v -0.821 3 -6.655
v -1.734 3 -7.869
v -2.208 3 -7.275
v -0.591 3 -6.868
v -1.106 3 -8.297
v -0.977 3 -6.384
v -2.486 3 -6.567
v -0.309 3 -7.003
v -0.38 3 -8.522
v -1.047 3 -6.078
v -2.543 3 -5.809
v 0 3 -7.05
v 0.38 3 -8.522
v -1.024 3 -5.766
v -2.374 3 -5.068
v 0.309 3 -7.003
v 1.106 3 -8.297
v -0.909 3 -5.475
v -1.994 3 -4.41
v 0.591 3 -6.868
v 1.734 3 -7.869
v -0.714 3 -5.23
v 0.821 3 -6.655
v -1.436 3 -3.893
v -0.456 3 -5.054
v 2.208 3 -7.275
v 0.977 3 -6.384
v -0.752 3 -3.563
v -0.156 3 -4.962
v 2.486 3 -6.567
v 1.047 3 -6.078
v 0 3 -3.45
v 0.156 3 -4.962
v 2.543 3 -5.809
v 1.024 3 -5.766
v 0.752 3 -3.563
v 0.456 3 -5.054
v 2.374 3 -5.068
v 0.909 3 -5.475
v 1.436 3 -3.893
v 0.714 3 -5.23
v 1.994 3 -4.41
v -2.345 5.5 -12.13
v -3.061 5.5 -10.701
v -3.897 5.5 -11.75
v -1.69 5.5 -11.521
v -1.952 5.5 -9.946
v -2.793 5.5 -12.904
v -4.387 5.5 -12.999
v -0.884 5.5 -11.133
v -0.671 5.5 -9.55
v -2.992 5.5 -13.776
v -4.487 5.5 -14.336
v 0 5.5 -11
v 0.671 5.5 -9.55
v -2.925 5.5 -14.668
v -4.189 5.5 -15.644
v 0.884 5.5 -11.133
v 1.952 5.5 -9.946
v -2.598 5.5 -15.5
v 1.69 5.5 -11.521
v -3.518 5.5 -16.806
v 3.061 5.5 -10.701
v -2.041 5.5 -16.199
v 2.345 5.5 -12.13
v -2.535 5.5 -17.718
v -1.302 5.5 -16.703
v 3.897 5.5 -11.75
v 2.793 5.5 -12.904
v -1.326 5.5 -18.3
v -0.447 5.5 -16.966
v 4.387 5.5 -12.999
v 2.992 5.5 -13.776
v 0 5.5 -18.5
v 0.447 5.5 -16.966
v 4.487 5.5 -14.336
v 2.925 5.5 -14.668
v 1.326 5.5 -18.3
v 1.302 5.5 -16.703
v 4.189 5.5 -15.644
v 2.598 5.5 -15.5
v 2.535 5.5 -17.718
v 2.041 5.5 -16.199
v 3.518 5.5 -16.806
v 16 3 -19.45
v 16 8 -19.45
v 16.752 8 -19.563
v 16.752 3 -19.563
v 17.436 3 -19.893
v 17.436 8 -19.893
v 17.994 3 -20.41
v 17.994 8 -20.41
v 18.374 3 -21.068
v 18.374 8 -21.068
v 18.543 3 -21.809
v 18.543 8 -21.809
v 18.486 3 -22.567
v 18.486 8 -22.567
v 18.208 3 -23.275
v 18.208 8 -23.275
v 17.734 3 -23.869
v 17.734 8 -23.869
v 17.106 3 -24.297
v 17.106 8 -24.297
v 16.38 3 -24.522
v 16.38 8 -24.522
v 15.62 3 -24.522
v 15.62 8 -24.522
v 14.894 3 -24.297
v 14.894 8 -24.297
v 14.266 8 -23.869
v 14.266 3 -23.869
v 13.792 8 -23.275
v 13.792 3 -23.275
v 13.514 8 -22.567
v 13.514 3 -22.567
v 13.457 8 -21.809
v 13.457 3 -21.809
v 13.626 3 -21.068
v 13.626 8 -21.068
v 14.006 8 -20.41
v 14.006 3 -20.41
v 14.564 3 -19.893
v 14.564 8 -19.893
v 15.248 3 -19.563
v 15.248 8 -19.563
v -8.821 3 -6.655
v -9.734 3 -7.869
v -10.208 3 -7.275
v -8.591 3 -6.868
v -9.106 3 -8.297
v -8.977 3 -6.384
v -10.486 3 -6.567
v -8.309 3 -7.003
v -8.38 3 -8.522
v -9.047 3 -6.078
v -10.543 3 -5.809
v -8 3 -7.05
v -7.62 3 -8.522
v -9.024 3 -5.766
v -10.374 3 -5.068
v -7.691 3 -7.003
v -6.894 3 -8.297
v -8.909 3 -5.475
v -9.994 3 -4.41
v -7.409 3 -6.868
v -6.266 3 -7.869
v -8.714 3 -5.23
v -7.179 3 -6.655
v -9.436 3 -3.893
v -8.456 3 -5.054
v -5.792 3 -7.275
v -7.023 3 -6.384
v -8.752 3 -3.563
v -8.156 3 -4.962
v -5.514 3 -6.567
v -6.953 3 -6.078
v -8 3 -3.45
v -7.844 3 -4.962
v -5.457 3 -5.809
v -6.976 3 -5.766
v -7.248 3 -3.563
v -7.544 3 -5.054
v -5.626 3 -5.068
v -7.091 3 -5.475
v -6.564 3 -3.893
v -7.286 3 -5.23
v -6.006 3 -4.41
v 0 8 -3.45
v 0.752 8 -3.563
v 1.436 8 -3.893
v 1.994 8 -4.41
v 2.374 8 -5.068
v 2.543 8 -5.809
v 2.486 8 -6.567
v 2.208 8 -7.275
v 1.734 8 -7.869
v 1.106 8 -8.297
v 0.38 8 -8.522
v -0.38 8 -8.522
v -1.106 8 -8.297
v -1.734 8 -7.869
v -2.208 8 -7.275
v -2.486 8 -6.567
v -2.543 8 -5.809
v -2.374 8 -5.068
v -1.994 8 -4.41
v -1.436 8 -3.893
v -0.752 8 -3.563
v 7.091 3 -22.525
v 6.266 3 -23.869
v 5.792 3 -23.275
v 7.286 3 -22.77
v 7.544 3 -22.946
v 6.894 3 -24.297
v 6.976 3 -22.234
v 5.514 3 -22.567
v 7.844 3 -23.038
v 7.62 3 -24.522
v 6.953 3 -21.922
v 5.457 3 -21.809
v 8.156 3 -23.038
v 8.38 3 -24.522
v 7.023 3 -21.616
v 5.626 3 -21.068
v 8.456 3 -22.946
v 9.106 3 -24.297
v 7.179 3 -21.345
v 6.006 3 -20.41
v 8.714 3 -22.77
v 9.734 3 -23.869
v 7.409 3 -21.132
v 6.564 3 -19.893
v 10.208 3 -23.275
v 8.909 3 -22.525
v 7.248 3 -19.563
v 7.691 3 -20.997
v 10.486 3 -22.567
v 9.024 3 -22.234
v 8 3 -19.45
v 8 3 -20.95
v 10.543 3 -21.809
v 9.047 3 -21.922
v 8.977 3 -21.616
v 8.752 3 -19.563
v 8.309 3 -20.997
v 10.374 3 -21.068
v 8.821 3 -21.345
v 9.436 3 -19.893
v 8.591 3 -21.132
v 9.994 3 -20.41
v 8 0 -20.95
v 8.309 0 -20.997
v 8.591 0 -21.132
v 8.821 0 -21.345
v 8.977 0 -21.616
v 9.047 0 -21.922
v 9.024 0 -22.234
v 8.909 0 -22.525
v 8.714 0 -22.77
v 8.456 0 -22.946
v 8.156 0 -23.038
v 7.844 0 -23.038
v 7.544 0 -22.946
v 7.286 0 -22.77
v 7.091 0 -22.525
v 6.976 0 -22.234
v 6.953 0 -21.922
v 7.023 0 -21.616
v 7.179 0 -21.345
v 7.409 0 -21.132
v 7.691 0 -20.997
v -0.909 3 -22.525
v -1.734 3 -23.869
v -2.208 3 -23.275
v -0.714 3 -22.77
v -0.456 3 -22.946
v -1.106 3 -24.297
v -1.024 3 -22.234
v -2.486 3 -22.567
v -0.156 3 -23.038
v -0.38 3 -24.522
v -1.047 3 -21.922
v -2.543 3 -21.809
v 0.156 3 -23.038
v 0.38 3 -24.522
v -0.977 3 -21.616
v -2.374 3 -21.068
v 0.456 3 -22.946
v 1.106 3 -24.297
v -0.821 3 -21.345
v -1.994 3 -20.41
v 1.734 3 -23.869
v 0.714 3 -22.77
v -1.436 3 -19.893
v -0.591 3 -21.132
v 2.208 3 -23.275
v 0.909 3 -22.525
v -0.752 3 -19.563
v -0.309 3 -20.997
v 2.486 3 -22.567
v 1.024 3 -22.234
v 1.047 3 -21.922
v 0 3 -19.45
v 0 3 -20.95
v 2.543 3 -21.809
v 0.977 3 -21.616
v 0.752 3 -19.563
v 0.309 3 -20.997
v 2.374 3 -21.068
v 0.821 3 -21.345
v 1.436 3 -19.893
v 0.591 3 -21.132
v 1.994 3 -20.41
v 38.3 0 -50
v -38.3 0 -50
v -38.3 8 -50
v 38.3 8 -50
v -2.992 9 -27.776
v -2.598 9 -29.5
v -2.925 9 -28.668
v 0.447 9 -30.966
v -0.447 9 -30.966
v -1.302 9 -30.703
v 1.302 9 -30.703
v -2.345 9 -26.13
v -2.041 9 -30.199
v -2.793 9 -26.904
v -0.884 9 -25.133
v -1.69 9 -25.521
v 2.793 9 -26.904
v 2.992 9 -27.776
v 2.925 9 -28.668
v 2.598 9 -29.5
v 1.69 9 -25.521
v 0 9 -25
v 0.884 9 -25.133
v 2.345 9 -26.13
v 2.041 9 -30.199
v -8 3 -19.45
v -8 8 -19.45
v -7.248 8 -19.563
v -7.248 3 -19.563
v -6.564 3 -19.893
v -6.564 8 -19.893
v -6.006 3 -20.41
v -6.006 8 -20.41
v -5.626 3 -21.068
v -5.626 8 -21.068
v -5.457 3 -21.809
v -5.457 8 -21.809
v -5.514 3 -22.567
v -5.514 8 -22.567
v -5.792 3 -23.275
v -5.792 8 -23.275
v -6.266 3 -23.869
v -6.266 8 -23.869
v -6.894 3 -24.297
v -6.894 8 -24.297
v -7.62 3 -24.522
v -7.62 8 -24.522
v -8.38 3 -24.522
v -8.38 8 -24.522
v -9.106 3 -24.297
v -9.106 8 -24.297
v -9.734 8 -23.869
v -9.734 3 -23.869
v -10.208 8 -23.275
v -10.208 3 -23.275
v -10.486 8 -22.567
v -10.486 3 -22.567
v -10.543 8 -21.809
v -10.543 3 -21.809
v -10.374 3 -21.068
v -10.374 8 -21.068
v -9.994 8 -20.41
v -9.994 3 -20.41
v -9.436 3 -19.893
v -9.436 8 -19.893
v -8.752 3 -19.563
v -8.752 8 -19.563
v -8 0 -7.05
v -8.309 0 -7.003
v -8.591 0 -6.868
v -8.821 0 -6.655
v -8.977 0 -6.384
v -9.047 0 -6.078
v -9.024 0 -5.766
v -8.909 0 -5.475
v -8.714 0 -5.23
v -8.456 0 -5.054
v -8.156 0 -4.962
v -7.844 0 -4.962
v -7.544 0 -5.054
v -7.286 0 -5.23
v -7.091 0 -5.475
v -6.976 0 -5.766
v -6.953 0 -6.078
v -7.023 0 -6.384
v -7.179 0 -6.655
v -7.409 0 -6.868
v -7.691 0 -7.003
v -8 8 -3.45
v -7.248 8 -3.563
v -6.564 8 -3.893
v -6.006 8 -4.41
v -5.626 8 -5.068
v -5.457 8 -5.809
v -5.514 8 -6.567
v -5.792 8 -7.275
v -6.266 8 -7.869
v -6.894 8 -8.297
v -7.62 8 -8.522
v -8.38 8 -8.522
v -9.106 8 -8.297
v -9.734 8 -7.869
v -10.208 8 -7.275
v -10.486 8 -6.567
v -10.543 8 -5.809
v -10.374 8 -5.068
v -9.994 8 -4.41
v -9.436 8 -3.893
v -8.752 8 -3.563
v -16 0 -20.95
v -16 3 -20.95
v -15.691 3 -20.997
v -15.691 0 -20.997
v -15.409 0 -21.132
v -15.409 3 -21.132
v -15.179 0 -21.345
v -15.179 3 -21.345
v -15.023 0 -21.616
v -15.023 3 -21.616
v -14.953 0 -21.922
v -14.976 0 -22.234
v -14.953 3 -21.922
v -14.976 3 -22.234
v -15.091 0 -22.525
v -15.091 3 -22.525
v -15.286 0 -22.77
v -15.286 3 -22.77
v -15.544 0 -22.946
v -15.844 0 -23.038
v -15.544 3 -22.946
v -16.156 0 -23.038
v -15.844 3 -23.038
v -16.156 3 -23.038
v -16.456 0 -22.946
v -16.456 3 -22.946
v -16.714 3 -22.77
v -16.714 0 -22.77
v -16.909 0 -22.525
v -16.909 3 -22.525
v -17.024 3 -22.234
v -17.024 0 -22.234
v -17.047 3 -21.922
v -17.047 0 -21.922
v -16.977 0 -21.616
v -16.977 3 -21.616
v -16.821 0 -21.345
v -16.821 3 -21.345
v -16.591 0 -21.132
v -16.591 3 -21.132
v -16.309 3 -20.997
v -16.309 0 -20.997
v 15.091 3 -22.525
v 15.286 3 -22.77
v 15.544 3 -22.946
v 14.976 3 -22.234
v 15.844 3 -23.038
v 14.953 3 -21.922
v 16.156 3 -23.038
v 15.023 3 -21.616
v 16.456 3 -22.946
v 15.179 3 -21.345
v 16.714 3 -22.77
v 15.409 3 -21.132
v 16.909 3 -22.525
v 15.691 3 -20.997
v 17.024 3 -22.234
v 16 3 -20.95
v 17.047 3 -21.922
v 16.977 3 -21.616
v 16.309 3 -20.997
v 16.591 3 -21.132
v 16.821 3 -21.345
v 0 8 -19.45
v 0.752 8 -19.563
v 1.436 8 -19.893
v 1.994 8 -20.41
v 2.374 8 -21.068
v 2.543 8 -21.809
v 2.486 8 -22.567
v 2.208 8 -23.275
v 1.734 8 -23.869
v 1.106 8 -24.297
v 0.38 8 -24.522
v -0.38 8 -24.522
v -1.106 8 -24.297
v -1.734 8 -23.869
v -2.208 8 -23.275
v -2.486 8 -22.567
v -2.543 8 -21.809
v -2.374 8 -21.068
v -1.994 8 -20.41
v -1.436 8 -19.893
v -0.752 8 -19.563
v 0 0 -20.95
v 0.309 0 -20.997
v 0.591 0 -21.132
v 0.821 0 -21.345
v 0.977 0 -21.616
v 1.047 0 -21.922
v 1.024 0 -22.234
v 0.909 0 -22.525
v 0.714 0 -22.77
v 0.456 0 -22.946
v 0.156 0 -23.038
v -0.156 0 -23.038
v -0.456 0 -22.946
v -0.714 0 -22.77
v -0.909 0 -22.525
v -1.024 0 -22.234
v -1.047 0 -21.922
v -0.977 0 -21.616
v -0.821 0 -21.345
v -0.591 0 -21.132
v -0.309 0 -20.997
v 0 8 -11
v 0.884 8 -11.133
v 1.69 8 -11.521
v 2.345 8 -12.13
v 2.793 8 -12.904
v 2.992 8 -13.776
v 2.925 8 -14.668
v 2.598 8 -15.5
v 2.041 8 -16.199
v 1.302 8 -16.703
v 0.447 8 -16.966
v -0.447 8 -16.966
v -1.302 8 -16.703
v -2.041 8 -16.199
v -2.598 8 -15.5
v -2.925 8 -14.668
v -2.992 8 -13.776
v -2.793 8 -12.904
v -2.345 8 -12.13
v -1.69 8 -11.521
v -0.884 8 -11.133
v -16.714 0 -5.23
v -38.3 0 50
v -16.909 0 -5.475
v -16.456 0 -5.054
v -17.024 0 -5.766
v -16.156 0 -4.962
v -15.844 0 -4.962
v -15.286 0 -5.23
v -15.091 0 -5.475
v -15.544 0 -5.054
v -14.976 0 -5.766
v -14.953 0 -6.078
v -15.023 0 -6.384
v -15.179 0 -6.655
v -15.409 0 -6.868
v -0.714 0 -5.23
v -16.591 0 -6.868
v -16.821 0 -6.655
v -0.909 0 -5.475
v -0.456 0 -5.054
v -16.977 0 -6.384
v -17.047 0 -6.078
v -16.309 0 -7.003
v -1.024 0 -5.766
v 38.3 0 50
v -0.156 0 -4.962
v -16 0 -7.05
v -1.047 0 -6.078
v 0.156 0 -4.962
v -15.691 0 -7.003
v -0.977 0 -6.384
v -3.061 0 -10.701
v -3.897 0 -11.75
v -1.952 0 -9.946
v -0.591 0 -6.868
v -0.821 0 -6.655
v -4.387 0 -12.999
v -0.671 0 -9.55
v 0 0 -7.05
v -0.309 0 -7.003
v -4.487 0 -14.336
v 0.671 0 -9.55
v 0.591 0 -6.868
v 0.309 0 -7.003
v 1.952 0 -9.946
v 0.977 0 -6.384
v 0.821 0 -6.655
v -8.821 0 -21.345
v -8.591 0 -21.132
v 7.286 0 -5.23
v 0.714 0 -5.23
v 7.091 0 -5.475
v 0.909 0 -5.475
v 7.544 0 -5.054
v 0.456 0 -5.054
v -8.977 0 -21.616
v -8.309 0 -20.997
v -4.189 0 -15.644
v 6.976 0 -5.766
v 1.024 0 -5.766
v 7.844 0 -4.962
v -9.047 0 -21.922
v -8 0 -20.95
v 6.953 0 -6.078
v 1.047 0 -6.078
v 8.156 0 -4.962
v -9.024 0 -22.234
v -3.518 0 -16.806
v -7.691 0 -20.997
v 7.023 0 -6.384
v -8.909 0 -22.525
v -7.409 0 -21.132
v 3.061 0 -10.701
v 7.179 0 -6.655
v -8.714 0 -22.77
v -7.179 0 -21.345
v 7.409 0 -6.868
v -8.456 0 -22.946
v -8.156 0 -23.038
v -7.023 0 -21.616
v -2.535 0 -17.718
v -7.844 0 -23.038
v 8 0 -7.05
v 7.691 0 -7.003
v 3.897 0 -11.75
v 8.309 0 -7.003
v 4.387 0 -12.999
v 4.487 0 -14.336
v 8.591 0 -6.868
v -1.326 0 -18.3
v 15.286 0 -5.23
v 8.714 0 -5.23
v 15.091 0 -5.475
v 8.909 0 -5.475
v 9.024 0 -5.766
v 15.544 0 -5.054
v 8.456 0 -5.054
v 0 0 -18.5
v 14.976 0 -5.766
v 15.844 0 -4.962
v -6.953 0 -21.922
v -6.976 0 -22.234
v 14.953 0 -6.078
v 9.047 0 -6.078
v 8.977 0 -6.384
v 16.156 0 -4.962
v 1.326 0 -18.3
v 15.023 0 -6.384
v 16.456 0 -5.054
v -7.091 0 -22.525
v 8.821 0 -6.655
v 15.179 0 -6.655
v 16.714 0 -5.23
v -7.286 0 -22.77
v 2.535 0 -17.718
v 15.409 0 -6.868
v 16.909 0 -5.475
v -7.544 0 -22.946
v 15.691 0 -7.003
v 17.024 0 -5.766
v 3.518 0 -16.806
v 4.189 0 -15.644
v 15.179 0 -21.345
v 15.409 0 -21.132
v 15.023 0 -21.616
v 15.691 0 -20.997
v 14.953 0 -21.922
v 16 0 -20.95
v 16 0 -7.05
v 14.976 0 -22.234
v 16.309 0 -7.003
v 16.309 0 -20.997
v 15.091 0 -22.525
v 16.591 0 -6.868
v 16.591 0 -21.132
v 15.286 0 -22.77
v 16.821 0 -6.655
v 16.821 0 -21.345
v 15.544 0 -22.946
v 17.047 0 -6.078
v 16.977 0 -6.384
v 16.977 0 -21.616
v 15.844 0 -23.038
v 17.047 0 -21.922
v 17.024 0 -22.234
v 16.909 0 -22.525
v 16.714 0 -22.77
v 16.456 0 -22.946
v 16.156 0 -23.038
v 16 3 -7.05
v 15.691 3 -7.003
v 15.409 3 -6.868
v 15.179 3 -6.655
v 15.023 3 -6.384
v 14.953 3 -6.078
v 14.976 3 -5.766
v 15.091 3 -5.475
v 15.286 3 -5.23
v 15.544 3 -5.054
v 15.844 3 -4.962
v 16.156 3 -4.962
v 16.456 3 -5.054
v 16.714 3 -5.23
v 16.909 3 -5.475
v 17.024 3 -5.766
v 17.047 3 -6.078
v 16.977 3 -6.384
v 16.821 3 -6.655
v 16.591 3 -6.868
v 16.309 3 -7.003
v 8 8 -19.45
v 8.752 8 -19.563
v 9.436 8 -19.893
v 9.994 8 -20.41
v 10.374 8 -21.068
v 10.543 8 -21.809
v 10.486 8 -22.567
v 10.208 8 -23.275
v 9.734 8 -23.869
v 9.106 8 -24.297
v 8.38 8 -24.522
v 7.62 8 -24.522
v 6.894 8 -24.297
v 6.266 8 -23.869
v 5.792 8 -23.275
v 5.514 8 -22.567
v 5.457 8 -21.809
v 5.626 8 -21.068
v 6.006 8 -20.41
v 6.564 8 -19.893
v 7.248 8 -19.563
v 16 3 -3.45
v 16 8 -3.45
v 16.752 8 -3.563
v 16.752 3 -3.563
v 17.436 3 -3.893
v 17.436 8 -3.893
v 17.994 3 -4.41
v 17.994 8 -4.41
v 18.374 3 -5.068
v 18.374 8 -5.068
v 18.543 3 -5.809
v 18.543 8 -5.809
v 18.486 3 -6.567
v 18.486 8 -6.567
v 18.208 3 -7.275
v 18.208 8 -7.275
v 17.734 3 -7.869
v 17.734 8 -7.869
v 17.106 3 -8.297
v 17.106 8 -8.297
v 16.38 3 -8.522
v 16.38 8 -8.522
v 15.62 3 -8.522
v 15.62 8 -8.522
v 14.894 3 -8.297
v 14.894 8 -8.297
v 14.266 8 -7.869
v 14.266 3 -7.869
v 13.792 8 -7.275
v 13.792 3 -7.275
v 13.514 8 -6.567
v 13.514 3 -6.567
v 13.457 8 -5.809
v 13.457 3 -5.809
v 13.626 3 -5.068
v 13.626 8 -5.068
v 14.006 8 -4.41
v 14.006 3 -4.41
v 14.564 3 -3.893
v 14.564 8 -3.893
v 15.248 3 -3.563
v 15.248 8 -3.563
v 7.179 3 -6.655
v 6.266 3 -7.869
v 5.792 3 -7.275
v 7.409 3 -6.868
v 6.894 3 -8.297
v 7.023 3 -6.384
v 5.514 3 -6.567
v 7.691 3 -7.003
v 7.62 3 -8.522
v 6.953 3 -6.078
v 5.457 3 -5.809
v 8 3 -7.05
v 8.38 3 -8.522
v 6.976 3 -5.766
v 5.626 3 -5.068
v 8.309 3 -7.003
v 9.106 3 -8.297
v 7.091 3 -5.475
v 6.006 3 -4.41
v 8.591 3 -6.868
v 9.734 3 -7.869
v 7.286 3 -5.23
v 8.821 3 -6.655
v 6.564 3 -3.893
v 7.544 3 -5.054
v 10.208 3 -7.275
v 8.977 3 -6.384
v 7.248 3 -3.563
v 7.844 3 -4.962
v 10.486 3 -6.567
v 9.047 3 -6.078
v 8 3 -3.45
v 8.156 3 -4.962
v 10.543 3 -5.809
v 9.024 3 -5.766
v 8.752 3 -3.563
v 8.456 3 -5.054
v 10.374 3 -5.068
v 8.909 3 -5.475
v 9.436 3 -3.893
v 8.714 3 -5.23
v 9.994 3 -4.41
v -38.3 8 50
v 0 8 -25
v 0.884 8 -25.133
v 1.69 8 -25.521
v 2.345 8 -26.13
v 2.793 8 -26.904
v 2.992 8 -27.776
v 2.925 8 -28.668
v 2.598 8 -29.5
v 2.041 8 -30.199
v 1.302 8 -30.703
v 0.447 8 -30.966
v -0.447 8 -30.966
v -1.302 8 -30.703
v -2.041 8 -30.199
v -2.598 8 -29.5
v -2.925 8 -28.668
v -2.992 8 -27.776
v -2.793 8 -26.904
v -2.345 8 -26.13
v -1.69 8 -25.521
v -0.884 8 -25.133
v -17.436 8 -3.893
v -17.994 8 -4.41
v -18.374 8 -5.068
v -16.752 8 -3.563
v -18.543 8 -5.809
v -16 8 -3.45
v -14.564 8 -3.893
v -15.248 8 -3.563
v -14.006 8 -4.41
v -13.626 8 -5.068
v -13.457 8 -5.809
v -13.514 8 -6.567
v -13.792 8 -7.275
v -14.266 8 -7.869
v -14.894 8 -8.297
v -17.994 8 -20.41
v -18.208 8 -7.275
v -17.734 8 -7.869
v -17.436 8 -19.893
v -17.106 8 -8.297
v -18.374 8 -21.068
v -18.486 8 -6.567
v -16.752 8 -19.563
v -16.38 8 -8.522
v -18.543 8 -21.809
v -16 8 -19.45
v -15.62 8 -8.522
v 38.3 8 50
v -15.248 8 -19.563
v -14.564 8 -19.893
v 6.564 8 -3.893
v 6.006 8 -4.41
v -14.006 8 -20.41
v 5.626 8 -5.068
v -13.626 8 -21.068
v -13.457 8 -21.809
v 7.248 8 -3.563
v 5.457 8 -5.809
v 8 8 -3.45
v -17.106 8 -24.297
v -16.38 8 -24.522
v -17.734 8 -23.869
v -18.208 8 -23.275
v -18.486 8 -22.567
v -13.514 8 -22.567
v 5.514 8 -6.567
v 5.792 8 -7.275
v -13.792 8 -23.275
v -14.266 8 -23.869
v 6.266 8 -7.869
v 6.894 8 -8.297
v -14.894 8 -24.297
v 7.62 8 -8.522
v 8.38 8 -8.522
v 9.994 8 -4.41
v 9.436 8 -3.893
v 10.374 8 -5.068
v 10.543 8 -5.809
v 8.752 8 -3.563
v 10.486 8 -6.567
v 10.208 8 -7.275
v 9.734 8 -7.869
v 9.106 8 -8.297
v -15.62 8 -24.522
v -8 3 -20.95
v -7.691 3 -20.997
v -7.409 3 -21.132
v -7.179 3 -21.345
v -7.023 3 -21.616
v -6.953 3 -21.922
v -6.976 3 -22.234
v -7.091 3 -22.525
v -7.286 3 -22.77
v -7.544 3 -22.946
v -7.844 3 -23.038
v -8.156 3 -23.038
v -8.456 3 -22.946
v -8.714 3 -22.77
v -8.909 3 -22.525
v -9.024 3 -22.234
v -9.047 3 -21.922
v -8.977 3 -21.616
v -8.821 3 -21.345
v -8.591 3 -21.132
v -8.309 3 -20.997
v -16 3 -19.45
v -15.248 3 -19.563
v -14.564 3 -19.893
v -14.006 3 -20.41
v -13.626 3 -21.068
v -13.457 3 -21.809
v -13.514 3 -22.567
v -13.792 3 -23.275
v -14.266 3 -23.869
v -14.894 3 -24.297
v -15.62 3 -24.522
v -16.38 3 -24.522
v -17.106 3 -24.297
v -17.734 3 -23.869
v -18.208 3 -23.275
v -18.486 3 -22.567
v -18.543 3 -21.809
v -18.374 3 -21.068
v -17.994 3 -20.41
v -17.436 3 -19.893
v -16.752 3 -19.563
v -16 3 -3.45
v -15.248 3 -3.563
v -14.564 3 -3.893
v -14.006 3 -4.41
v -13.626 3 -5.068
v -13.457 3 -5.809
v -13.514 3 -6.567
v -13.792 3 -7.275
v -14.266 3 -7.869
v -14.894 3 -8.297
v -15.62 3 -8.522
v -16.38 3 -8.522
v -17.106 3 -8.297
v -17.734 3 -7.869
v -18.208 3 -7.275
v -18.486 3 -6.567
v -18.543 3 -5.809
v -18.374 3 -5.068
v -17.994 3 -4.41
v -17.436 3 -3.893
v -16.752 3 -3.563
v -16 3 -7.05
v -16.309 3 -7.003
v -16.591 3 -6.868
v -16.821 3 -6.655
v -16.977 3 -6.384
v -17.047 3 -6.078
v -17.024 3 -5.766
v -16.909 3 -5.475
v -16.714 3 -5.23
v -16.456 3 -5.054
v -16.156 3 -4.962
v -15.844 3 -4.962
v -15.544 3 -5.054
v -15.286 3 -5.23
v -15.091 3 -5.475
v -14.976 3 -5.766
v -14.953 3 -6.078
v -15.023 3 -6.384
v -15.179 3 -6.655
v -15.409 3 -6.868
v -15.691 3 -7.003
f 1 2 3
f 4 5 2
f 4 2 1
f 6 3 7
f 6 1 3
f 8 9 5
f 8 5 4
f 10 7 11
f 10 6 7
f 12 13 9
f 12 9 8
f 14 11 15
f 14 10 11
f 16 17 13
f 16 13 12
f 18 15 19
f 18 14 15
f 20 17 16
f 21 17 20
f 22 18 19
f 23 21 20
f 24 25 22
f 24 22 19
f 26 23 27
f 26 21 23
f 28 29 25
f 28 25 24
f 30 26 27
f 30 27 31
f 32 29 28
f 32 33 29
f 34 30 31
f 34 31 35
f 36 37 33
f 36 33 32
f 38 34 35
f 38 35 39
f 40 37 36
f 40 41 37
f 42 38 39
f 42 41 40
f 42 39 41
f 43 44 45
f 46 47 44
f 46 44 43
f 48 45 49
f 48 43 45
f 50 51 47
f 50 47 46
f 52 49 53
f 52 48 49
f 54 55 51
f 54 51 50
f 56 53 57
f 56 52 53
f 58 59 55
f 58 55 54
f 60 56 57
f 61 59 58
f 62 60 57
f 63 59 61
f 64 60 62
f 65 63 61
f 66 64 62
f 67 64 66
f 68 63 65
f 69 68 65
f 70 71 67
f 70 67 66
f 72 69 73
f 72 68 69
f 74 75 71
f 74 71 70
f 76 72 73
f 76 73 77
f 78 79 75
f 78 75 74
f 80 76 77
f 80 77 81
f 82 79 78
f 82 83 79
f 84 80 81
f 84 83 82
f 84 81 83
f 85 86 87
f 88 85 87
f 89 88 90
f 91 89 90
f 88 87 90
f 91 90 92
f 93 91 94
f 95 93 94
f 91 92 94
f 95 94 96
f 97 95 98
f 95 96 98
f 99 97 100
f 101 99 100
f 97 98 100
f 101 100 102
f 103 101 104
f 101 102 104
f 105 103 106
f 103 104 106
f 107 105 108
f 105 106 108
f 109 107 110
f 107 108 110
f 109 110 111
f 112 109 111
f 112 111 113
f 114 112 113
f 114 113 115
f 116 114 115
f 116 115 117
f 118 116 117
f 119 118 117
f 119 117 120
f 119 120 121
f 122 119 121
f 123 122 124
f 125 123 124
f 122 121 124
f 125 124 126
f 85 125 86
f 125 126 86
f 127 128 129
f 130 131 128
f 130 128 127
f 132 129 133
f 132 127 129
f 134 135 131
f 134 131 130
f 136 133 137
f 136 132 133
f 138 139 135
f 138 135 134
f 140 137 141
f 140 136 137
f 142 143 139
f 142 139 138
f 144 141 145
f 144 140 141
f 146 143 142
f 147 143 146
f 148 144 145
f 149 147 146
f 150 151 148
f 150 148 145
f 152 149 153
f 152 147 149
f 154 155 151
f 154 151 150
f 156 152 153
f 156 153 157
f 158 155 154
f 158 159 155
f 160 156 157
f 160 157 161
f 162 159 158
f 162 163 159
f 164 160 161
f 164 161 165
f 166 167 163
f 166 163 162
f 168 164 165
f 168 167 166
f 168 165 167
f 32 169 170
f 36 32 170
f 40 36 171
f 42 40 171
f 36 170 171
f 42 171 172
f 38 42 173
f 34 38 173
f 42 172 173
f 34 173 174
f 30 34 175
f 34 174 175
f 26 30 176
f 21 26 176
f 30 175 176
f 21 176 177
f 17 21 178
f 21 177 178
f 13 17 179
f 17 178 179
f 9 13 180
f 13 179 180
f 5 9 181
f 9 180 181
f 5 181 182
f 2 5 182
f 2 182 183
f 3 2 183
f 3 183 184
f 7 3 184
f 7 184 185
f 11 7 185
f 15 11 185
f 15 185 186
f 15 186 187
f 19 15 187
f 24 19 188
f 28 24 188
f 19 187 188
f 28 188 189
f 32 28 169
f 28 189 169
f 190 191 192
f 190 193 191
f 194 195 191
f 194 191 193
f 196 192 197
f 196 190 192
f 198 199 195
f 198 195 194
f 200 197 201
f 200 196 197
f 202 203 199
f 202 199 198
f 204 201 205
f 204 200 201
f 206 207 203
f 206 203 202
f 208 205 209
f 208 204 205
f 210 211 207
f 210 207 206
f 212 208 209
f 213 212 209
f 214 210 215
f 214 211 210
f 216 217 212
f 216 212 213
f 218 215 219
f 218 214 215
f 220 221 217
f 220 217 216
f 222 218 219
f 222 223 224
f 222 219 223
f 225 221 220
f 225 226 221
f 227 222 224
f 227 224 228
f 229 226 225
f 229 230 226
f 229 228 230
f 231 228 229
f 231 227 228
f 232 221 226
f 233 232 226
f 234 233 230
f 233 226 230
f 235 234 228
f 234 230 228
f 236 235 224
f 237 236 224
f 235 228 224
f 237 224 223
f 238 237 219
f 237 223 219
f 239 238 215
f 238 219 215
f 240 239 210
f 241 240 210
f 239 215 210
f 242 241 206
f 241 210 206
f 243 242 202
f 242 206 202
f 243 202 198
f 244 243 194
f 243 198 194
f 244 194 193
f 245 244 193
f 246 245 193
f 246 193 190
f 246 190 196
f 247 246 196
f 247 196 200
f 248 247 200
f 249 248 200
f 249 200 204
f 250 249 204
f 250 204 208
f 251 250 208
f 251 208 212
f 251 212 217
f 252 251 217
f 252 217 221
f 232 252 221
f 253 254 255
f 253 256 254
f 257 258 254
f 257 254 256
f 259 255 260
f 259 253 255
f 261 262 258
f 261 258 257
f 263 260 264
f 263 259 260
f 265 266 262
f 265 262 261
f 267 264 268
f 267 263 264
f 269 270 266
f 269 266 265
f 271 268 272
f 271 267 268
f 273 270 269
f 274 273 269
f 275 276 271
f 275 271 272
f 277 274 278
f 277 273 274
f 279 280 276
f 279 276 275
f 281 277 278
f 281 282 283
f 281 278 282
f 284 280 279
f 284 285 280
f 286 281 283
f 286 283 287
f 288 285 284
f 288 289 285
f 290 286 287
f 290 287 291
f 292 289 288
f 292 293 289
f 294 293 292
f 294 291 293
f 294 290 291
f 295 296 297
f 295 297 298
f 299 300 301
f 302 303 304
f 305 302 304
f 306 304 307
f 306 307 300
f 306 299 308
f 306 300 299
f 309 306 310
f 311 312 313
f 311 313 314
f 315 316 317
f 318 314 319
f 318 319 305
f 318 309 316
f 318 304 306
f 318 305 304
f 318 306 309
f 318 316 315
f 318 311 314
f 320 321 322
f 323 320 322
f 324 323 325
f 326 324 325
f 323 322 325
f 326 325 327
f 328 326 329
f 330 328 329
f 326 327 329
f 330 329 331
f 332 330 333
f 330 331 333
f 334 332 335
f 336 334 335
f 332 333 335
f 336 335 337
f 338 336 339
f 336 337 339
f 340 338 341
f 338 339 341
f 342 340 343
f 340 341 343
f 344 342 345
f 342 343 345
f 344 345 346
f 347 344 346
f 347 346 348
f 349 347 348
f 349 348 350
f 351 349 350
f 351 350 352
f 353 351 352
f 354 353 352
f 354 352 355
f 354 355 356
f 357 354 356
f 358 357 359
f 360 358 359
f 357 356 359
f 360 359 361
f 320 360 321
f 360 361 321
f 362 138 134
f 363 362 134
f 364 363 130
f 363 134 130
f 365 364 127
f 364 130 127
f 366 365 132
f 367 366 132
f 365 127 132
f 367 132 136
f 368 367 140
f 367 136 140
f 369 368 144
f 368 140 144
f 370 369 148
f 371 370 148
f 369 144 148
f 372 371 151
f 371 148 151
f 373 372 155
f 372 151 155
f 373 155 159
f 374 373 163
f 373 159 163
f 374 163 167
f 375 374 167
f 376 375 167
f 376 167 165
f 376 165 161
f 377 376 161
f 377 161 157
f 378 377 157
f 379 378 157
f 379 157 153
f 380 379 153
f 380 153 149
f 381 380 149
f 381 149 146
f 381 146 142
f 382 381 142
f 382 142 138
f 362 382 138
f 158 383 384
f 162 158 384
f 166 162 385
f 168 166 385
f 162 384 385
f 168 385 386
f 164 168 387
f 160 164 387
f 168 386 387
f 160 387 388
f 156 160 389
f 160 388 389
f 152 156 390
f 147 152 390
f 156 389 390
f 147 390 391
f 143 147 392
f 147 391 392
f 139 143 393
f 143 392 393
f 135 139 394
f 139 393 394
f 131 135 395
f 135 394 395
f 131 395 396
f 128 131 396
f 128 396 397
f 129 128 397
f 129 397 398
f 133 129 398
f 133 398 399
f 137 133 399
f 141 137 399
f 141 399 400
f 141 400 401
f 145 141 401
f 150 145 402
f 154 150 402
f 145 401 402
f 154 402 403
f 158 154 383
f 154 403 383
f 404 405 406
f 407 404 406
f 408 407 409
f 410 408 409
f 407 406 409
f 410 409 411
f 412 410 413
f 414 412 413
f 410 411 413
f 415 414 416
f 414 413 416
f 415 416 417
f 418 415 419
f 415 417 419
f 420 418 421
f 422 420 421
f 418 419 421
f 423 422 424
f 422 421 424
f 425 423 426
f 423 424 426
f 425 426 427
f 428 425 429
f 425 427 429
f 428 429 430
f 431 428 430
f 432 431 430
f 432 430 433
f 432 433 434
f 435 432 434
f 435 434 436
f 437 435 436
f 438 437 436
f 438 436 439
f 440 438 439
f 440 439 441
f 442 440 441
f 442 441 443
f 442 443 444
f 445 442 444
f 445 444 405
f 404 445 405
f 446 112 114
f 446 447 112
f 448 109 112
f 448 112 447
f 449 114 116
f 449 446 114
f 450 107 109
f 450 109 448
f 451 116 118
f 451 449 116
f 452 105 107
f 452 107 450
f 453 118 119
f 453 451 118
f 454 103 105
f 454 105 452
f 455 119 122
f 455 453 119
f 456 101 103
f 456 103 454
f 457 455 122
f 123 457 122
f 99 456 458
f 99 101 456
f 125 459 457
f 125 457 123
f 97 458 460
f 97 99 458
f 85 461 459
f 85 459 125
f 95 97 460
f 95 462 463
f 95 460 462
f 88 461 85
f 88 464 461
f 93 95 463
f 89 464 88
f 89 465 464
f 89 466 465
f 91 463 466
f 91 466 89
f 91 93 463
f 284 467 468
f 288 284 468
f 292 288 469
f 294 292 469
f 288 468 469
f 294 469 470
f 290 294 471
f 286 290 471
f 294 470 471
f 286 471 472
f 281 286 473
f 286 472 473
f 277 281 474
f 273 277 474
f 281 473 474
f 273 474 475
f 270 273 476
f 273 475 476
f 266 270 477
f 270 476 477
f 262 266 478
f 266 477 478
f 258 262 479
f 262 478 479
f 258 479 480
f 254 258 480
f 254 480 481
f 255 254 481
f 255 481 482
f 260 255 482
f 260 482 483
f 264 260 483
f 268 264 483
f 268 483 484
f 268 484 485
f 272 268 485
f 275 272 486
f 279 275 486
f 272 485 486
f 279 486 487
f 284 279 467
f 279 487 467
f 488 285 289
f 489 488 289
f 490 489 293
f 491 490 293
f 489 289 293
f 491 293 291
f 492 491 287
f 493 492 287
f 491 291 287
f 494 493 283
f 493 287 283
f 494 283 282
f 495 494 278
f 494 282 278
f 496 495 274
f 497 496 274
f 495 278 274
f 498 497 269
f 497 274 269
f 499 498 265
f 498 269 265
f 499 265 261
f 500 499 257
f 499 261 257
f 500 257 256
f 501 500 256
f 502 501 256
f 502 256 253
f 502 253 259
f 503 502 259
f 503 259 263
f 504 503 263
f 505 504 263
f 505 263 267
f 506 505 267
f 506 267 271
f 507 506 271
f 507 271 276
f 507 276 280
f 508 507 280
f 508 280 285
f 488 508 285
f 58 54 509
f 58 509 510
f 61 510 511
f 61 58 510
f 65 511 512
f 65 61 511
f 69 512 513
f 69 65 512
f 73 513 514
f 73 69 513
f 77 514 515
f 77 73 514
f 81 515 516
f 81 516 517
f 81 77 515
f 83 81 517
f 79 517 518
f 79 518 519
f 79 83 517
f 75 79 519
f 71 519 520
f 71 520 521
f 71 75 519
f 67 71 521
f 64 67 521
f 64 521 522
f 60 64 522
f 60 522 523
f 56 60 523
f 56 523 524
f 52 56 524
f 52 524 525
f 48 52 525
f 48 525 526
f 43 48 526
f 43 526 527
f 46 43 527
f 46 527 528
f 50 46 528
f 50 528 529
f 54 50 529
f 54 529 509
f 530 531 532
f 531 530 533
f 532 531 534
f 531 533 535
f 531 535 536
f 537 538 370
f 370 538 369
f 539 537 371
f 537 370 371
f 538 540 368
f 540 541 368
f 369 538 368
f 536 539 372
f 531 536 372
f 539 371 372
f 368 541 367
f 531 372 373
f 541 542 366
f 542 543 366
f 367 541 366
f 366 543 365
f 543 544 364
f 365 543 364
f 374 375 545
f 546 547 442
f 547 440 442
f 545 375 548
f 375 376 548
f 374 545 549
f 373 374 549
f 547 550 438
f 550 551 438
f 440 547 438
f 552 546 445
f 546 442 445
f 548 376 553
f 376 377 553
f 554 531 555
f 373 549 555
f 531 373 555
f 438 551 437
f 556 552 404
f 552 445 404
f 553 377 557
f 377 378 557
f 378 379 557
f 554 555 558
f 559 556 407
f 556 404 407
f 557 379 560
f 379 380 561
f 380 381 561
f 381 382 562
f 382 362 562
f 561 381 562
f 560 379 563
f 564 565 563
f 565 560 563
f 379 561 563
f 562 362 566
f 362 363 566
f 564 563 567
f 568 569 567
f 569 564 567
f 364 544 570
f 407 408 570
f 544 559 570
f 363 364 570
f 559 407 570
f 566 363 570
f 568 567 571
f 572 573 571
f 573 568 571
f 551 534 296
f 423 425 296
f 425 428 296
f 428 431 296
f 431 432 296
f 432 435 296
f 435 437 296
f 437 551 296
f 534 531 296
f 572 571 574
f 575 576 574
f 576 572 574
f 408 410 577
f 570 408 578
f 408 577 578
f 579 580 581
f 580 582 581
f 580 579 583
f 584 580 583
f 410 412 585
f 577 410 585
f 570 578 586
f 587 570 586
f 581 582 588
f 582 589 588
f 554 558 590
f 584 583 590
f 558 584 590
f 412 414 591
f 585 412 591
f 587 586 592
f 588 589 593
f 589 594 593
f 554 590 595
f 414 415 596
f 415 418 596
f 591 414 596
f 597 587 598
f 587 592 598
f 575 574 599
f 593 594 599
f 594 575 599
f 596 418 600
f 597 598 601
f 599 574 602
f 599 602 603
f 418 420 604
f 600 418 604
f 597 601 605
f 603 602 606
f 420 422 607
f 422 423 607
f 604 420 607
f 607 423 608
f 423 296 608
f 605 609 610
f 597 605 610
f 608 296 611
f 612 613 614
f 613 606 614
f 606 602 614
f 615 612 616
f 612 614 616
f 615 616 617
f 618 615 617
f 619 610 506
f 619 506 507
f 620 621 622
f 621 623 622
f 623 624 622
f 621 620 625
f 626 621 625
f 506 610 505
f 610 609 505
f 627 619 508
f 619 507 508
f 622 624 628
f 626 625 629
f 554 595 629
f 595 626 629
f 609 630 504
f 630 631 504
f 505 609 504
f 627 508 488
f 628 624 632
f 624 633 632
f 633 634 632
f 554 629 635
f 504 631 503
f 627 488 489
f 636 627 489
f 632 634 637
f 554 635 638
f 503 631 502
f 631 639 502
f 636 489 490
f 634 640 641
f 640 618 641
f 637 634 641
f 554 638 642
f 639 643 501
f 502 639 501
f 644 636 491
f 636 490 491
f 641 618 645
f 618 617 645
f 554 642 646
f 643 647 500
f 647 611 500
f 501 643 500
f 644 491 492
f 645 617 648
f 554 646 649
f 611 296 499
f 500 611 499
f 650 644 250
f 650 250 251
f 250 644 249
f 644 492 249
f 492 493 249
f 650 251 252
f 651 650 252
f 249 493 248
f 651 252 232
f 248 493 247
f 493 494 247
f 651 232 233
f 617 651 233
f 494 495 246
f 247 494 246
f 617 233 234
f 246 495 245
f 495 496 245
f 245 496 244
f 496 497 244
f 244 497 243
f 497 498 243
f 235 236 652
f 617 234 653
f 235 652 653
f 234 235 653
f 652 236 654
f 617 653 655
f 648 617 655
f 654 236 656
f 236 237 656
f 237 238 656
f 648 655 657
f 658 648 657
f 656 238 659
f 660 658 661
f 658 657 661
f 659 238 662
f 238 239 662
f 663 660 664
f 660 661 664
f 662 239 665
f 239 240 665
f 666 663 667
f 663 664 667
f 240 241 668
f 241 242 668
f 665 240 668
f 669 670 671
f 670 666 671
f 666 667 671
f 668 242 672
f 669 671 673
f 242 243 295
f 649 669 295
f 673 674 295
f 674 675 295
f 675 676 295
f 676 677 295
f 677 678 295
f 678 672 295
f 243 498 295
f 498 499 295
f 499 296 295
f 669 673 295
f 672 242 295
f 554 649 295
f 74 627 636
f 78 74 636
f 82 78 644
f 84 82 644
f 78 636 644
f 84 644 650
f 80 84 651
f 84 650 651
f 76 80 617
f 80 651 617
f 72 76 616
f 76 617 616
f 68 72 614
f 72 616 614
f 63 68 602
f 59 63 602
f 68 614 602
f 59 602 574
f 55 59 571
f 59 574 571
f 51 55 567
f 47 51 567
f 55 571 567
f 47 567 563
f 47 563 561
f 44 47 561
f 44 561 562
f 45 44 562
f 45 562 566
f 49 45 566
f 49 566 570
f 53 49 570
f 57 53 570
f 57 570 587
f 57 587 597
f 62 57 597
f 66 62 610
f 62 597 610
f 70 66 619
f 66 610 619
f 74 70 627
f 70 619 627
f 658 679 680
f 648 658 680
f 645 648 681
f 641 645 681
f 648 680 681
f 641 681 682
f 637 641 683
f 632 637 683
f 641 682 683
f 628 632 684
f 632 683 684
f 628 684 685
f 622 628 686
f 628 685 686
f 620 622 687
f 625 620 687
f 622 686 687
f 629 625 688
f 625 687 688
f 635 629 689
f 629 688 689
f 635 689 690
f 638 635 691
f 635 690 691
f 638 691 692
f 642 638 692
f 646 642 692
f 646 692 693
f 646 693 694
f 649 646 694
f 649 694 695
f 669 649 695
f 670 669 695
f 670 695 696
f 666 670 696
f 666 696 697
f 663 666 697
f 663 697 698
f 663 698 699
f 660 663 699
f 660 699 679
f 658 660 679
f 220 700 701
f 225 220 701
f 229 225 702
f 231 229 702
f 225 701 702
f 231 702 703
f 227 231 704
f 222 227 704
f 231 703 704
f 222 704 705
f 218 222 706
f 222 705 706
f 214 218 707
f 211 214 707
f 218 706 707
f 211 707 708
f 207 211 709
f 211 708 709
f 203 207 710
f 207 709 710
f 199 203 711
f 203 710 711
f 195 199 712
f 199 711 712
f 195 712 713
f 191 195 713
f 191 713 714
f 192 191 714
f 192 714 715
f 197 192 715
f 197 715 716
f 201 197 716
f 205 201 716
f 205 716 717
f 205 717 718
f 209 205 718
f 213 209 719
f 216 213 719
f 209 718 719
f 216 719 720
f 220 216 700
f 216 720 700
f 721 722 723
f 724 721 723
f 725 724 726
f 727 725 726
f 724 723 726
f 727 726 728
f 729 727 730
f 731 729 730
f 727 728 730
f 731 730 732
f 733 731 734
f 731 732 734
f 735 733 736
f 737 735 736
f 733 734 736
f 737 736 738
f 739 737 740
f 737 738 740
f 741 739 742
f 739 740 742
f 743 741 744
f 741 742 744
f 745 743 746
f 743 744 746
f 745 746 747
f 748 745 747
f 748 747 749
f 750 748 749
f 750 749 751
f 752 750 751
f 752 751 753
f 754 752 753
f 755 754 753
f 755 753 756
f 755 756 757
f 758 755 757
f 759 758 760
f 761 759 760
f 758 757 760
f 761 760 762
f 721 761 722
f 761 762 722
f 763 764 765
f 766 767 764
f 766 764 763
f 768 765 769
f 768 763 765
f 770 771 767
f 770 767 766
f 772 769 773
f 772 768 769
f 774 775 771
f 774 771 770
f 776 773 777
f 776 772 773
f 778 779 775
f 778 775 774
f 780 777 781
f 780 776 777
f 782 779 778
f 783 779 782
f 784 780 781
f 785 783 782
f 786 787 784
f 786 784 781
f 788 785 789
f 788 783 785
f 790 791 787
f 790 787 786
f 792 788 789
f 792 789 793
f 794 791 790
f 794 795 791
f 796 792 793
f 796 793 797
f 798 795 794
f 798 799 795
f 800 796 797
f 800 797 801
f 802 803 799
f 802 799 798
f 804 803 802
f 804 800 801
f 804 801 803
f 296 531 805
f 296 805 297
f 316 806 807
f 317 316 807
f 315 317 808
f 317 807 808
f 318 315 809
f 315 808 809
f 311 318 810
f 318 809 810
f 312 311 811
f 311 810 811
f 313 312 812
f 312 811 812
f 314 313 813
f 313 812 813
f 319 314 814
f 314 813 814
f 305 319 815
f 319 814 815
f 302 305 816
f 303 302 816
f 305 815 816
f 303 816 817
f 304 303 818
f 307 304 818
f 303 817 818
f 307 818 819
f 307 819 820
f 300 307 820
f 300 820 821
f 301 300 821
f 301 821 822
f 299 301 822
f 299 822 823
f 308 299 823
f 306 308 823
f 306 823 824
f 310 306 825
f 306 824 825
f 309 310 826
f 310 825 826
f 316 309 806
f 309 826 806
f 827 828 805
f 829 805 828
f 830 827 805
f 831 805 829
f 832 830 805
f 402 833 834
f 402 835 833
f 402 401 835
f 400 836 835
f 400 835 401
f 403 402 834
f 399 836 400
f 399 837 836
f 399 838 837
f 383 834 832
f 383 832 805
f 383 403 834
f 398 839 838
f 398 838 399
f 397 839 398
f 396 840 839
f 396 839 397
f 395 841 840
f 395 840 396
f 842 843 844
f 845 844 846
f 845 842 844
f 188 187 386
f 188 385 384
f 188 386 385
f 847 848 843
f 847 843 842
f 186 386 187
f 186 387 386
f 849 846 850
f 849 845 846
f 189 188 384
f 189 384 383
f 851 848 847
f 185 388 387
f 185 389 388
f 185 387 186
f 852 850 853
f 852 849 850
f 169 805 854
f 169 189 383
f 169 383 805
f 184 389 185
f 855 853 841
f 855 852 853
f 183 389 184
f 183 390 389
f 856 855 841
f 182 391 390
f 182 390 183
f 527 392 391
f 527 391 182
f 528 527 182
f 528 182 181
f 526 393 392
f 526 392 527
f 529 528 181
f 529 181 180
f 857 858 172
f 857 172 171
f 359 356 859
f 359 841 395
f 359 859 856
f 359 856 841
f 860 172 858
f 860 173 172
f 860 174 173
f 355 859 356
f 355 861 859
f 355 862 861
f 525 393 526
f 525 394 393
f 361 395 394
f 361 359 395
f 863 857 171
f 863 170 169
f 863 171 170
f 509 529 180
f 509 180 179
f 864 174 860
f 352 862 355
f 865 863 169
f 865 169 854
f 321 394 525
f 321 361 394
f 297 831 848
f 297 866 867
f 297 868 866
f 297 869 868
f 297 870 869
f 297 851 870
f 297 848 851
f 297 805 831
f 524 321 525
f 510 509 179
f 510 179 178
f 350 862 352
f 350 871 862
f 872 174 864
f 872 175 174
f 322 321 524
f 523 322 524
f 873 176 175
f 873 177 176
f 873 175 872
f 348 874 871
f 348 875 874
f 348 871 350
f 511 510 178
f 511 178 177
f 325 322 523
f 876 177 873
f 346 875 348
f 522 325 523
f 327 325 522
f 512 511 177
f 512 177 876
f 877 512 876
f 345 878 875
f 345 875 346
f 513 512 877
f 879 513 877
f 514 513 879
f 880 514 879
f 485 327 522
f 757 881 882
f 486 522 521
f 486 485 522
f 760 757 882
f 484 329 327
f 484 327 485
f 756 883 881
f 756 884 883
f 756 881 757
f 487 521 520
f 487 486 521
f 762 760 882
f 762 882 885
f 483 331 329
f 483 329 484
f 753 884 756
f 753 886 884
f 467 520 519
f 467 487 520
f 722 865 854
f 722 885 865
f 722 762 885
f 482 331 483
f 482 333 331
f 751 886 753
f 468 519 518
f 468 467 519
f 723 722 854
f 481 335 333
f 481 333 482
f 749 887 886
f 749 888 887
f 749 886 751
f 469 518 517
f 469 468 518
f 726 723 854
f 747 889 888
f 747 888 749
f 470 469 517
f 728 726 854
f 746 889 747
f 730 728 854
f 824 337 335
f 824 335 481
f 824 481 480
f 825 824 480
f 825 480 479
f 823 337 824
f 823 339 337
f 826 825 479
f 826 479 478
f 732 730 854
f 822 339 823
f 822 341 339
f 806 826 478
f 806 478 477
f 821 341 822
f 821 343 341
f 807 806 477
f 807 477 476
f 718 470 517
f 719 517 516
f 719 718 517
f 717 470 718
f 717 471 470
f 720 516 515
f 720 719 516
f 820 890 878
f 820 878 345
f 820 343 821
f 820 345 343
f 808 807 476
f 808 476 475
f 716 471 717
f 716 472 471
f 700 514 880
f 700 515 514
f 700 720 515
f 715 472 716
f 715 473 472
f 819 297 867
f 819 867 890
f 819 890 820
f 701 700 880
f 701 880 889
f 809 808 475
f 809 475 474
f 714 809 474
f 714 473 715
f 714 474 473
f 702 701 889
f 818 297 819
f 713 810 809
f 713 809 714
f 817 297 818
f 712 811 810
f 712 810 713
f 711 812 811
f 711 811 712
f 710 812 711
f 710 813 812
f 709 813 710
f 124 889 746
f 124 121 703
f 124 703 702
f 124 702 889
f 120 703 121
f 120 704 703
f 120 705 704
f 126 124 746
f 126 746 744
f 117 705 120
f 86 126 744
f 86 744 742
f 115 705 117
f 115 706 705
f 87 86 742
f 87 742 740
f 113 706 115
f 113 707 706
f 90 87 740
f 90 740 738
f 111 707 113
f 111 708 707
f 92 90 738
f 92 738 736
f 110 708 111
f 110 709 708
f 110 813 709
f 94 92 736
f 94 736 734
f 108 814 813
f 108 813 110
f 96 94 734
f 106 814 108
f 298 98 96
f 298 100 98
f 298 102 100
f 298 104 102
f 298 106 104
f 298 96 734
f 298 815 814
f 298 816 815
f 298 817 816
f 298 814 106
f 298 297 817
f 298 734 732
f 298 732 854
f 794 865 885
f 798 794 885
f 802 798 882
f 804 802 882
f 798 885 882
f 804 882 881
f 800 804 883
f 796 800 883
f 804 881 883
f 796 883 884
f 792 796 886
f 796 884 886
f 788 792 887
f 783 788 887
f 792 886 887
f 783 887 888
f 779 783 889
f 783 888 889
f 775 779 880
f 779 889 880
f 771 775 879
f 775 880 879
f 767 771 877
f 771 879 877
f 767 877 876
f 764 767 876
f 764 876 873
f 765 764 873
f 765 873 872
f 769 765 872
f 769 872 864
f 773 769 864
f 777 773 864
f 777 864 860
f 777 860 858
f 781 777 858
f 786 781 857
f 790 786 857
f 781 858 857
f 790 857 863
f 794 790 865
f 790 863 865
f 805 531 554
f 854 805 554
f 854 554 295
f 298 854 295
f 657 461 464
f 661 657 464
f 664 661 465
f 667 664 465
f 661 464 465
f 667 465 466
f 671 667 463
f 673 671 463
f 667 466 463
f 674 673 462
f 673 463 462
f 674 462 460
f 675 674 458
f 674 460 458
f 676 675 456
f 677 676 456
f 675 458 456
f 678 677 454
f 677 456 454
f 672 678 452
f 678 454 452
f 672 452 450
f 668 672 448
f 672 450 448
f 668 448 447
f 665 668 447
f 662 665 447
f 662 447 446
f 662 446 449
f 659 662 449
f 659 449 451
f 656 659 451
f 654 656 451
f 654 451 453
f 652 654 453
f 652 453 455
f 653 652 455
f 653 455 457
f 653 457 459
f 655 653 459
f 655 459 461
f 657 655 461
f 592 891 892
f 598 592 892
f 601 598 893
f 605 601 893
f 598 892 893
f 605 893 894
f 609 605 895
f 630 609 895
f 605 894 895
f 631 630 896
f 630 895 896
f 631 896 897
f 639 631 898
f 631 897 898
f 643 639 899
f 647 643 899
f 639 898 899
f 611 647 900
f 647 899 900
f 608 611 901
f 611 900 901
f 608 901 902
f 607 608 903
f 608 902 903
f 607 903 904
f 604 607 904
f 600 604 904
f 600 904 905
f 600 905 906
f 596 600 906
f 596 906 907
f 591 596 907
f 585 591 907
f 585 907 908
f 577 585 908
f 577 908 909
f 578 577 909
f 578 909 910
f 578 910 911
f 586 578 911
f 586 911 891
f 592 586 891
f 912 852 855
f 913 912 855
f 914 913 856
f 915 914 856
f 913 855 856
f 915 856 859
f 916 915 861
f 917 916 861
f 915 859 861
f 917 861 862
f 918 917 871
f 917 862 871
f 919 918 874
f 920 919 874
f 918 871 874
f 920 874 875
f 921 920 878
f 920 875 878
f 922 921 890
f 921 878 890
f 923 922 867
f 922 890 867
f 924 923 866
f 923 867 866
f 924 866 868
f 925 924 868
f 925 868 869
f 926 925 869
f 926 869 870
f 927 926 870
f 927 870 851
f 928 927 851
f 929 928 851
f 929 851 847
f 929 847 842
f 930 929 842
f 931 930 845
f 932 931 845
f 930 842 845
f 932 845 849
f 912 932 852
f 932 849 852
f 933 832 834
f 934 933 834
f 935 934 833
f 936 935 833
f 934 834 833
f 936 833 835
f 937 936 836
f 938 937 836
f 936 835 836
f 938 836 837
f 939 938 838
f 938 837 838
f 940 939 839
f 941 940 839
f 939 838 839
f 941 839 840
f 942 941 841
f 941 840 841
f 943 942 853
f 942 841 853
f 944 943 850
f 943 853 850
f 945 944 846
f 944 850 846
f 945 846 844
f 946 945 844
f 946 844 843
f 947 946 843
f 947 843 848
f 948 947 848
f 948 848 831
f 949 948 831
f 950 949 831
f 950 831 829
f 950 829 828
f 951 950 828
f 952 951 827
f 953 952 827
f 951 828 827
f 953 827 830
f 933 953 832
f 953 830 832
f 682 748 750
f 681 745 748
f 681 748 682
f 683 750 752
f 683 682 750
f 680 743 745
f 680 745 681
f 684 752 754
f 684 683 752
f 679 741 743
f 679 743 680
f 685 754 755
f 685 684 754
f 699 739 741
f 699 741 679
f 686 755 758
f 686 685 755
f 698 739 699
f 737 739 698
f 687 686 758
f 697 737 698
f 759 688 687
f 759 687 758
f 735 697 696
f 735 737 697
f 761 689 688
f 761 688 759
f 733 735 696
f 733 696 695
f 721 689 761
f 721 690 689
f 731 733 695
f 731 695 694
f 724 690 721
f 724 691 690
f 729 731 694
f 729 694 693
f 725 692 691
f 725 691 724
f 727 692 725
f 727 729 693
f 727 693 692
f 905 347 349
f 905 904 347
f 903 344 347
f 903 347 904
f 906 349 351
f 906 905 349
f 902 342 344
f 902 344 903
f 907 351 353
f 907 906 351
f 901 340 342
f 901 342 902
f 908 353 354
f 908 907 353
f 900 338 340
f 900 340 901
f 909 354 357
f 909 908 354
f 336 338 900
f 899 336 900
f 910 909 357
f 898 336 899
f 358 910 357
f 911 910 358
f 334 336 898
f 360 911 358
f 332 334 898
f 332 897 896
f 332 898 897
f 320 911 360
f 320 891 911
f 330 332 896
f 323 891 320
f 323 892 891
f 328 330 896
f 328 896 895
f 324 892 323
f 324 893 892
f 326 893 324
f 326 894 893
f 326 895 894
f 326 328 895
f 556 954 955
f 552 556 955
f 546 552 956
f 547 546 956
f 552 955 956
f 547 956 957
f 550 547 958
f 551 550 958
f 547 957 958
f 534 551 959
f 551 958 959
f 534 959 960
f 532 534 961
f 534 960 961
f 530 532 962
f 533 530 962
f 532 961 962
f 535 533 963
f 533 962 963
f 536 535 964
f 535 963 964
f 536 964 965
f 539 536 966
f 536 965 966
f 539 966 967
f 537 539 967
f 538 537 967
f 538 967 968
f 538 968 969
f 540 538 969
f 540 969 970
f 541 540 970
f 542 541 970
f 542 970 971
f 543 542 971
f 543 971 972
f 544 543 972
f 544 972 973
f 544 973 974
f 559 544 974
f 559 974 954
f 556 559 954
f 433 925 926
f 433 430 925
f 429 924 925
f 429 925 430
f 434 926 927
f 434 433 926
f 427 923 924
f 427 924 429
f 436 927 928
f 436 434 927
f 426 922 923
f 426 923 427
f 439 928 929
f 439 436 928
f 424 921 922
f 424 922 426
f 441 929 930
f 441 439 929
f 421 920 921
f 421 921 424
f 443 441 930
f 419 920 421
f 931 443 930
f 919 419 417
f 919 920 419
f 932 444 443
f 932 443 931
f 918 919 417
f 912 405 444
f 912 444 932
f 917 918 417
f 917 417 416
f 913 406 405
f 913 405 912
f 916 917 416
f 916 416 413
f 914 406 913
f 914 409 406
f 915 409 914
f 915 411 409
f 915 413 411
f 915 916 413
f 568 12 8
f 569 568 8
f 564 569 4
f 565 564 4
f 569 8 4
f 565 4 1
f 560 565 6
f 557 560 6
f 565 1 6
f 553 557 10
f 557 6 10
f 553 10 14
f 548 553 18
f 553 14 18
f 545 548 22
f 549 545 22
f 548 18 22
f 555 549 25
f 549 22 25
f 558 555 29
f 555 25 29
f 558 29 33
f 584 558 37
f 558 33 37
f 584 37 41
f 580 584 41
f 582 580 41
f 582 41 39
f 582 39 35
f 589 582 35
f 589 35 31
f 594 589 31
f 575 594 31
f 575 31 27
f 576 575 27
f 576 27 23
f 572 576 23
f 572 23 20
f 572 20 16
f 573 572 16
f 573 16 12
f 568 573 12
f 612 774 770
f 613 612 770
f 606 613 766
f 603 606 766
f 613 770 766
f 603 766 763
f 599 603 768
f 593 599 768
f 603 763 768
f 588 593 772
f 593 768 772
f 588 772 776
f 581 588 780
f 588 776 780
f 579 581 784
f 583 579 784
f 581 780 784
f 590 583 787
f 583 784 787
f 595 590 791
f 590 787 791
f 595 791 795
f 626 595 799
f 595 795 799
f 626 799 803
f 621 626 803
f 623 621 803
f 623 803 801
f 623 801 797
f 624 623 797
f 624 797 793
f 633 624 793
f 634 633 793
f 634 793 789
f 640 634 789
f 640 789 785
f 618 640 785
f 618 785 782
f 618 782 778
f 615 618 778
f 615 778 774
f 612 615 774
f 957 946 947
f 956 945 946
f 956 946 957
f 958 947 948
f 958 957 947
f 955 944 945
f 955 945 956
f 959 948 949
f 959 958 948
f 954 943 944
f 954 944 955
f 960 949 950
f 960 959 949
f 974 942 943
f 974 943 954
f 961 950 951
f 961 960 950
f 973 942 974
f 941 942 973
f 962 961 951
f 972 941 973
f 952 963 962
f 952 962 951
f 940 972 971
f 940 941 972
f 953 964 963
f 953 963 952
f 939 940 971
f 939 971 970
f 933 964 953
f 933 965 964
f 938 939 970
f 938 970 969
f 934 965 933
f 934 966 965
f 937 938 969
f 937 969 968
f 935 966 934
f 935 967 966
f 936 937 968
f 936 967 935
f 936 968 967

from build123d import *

# Parameters (mm, degrees)
SKETCH_1_W          = 76.6
SKETCH_1_H          = 100
SKETCH_1_R          = 3
EXTRUDE_1_DEPTH     = 8
SKETCH_2_R          = 4.5
CUT_EXTRUDE_1_DEPTH = 5.5
SKETCH_3_R          = 3
EXTRUDE_2_DEPTH     = 1
SKETCH_5_R          = 1.05
CUT_EXTRUDE_2_DEPTH = 64.489290435
SKETCH_6_R          = 2.55
CUT_EXTRUDE_3_DEPTH = 5


with BuildPart() as part:
    # ｽｹｯﾁ1 → ﾎﾞｽ - 押し出し1 (new body)
    with BuildSketch(Plane(origin=(0, 0, 0), x_dir=(1, 0, 0), z_dir=(0, 1, 0))):
        Rectangle(SKETCH_1_W, SKETCH_1_H)
        with Locations(Location((0, 14, 0), (0, 0, 270))):
            Circle(SKETCH_1_R, mode=Mode.SUBTRACT)
    extrude(amount=EXTRUDE_1_DEPTH)

    # ｽｹｯﾁ2 → ｶｯﾄ - 押し出し1 (cut)
    with BuildSketch(Plane.XZ):
        with Locations(Location((0, -14, 0), (0, 0, 270))):
            Circle(SKETCH_2_R)
    extrude(amount=-CUT_EXTRUDE_1_DEPTH, mode=Mode.SUBTRACT)

    # ｽｹｯﾁ3 → ﾎﾞｽ - 押し出し2 (add)
    with BuildSketch(Plane(origin=(0, 8, 0), x_dir=(1, 0, 0), z_dir=(0, 1, 0))):
        with Locations(Location((0, 28, 0), (0, 0, 270))):
            Circle(SKETCH_3_R)
    extrude(amount=EXTRUDE_2_DEPTH)

    # ｽｹｯﾁ5 → ｶｯﾄ - 押し出し2 (cut, through all)
    with BuildSketch(Plane(origin=(0, 8, 0), x_dir=(1, 0, 0), z_dir=(0, 1, 0))):
        with Locations(Location((0, 22, 0), (0, 0, 270))):
            Circle(SKETCH_5_R)
        with Locations(Location((8, 22, 0), (0, 0, 270))):
            Circle(SKETCH_5_R)
        with Locations(Location((16, 22, 0), (0, 0, 270))):
            Circle(SKETCH_5_R)
        with Locations(Location((-8, 22, 0), (0, 0, 270))):
            Circle(SKETCH_5_R)
        with Locations(Location((-16, 22, 0), (0, 0, 270))):
            Circle(SKETCH_5_R)
        with Locations(Location((-16, 6, 0), (0, 0, 90))):
            Circle(SKETCH_5_R)
        with Locations(Location((-8, 6, 0), (0, 0, 90))):
            Circle(SKETCH_5_R)
        with Locations(Location((16, 6, 0), (0, 0, 90))):
            Circle(SKETCH_5_R)
        with Locations(Location((8, 6, 0), (0, 0, 90))):
            Circle(SKETCH_5_R)
        with Locations(Location((0, 6, 0), (0, 0, 90))):
            Circle(SKETCH_5_R)
    extrude(amount=-CUT_EXTRUDE_2_DEPTH, mode=Mode.SUBTRACT)

    # ｽｹｯﾁ6 → ｶｯﾄ - 押し出し3 (cut)
    with BuildSketch(Plane(origin=(0, 8, 0), x_dir=(1, 0, 0), z_dir=(0, 1, 0))):
        with Locations(Location((-8, 22, 0), (0, 0, 270))):
            Circle(SKETCH_6_R)
        with Locations(Location((-16, 22, 0), (0, 0, 270))):
            Circle(SKETCH_6_R)
        with Locations(Location((0, 22, 0), (0, 0, 270))):
            Circle(SKETCH_6_R)
        with Locations(Location((8, 22, 0), (0, 0, 270))):
            Circle(SKETCH_6_R)
        with Locations(Location((16, 22, 0), (0, 0, 270))):
            Circle(SKETCH_6_R)
        with Locations(Location((-8, 6, 0), (0, 0, 270))):
            Circle(SKETCH_6_R)
        with Locations(Location((0, 6, 0), (0, 0, 270))):
            Circle(SKETCH_6_R)
        with Locations(Location((8, 6, 0), (0, 0, 270))):
            Circle(SKETCH_6_R)
        with Locations(Location((16, 6, 0), (0, 0, 270))):
            Circle(SKETCH_6_R)
        with Locations(Location((-16, 6, 0), (0, 0, 270))):
            Circle(SKETCH_6_R)
    extrude(amount=-CUT_EXTRUDE_3_DEPTH, mode=Mode.SUBTRACT)


solid = part.part
